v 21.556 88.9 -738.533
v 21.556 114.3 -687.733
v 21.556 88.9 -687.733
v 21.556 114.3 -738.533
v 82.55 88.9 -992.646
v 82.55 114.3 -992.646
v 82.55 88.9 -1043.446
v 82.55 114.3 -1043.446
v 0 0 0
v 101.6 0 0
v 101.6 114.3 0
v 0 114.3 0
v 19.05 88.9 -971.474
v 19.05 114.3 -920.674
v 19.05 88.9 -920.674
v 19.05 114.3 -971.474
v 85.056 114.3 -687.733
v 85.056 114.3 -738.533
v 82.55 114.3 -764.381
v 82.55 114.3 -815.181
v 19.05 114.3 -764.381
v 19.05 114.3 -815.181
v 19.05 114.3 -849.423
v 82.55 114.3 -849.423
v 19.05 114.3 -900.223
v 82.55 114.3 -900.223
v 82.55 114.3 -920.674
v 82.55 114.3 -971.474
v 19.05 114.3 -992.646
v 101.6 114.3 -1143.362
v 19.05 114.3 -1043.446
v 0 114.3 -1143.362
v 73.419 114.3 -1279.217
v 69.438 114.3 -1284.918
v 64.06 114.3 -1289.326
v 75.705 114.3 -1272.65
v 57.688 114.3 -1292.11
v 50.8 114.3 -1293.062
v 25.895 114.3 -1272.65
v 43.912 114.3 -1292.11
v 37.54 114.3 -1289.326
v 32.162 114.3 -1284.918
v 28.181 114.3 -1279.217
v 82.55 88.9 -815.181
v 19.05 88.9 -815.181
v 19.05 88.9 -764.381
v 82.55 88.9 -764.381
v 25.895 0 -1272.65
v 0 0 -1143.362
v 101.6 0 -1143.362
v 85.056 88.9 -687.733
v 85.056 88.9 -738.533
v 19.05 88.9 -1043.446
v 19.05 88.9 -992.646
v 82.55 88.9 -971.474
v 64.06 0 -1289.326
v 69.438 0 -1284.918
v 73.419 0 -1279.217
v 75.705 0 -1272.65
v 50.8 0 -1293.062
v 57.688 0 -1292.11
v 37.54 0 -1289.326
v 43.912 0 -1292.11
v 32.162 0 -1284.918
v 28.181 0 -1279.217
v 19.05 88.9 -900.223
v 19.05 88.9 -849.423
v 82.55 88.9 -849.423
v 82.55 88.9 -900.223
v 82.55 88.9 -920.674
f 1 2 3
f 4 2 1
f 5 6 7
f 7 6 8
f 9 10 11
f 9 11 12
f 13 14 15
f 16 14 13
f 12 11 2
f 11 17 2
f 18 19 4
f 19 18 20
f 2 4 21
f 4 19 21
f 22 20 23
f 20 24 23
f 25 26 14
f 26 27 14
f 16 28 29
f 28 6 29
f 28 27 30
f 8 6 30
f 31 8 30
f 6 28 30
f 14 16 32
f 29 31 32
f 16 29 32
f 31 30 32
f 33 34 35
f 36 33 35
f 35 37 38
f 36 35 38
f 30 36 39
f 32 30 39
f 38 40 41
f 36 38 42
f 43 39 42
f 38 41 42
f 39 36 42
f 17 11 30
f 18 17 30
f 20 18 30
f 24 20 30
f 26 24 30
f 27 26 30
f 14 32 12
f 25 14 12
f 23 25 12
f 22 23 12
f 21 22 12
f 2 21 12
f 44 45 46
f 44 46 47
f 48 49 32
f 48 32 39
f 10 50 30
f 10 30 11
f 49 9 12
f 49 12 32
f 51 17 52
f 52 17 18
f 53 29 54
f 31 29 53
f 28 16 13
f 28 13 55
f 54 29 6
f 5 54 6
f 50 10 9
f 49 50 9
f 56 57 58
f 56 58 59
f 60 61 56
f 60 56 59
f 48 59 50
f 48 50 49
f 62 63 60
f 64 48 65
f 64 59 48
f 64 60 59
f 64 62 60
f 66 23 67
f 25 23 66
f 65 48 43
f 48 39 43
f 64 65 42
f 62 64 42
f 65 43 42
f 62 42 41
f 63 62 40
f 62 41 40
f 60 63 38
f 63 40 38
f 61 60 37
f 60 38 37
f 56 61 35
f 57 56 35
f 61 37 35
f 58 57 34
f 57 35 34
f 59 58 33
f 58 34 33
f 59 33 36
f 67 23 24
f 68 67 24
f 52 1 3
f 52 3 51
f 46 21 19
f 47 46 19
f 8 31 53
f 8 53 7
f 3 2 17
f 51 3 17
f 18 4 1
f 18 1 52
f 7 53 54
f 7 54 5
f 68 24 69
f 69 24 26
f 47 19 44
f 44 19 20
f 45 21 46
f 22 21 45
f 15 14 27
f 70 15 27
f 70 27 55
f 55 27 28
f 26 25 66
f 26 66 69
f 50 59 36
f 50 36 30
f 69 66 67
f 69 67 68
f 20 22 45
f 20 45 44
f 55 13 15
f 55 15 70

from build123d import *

# Parameters (mm, degrees)
BOSS_EXTRUDE1_DEPTH = 114.3
FILLET2_R           = 25.4
SKETCH2_W           = 63.5
SKETCH2_H           = 50.8
CUT_EXTRUDE1_DEPTH  = 25.4


with BuildPart() as part:
    # Sketch1 → Boss-Extrude1 (new body)
    with BuildSketch(Plane(origin=(0, 0, 0), x_dir=(1, 0, 0), z_dir=(0, 1, 0))):
        Polygon((0, 0), (0, 1143.361543418), (50.8, 1397), (101.6, 1143.361543418), (101.6, 0), align=None)
    extrude(amount=BOSS_EXTRUDE1_DEPTH)

    # Fillet2
    fillet2_edges = [part.edges().sort_by_distance(p)[0] for p in [
        (50.8, 57.15, -1397),
    ]]
    fillet(fillet2_edges, radius=FILLET2_R)

    # Sketch2 → Cut-Extrude1 (cut)
    with BuildSketch(Plane(origin=(0, 114.3, 0), x_dir=(1, 0, 0), z_dir=(0, 1, 0))):
        with Locations((50.8, 946.074302167)):
            Rectangle(SKETCH2_W, SKETCH2_H)
        with Locations((50.8, 1018.046396499)):
            Rectangle(SKETCH2_W, SKETCH2_H)
        with Locations((50.8, 874.822900853)):
            Rectangle(SKETCH2_W, SKETCH2_H)
        with Locations((50.8, 789.781020197)):
            Rectangle(SKETCH2_W, SKETCH2_H)
        with Locations((53.306135385, 713.133095909)):
            Rectangle(SKETCH2_W, SKETCH2_H)
    extrude(amount=-CUT_EXTRUDE1_DEPTH, mode=Mode.SUBTRACT)


solid = part.part
